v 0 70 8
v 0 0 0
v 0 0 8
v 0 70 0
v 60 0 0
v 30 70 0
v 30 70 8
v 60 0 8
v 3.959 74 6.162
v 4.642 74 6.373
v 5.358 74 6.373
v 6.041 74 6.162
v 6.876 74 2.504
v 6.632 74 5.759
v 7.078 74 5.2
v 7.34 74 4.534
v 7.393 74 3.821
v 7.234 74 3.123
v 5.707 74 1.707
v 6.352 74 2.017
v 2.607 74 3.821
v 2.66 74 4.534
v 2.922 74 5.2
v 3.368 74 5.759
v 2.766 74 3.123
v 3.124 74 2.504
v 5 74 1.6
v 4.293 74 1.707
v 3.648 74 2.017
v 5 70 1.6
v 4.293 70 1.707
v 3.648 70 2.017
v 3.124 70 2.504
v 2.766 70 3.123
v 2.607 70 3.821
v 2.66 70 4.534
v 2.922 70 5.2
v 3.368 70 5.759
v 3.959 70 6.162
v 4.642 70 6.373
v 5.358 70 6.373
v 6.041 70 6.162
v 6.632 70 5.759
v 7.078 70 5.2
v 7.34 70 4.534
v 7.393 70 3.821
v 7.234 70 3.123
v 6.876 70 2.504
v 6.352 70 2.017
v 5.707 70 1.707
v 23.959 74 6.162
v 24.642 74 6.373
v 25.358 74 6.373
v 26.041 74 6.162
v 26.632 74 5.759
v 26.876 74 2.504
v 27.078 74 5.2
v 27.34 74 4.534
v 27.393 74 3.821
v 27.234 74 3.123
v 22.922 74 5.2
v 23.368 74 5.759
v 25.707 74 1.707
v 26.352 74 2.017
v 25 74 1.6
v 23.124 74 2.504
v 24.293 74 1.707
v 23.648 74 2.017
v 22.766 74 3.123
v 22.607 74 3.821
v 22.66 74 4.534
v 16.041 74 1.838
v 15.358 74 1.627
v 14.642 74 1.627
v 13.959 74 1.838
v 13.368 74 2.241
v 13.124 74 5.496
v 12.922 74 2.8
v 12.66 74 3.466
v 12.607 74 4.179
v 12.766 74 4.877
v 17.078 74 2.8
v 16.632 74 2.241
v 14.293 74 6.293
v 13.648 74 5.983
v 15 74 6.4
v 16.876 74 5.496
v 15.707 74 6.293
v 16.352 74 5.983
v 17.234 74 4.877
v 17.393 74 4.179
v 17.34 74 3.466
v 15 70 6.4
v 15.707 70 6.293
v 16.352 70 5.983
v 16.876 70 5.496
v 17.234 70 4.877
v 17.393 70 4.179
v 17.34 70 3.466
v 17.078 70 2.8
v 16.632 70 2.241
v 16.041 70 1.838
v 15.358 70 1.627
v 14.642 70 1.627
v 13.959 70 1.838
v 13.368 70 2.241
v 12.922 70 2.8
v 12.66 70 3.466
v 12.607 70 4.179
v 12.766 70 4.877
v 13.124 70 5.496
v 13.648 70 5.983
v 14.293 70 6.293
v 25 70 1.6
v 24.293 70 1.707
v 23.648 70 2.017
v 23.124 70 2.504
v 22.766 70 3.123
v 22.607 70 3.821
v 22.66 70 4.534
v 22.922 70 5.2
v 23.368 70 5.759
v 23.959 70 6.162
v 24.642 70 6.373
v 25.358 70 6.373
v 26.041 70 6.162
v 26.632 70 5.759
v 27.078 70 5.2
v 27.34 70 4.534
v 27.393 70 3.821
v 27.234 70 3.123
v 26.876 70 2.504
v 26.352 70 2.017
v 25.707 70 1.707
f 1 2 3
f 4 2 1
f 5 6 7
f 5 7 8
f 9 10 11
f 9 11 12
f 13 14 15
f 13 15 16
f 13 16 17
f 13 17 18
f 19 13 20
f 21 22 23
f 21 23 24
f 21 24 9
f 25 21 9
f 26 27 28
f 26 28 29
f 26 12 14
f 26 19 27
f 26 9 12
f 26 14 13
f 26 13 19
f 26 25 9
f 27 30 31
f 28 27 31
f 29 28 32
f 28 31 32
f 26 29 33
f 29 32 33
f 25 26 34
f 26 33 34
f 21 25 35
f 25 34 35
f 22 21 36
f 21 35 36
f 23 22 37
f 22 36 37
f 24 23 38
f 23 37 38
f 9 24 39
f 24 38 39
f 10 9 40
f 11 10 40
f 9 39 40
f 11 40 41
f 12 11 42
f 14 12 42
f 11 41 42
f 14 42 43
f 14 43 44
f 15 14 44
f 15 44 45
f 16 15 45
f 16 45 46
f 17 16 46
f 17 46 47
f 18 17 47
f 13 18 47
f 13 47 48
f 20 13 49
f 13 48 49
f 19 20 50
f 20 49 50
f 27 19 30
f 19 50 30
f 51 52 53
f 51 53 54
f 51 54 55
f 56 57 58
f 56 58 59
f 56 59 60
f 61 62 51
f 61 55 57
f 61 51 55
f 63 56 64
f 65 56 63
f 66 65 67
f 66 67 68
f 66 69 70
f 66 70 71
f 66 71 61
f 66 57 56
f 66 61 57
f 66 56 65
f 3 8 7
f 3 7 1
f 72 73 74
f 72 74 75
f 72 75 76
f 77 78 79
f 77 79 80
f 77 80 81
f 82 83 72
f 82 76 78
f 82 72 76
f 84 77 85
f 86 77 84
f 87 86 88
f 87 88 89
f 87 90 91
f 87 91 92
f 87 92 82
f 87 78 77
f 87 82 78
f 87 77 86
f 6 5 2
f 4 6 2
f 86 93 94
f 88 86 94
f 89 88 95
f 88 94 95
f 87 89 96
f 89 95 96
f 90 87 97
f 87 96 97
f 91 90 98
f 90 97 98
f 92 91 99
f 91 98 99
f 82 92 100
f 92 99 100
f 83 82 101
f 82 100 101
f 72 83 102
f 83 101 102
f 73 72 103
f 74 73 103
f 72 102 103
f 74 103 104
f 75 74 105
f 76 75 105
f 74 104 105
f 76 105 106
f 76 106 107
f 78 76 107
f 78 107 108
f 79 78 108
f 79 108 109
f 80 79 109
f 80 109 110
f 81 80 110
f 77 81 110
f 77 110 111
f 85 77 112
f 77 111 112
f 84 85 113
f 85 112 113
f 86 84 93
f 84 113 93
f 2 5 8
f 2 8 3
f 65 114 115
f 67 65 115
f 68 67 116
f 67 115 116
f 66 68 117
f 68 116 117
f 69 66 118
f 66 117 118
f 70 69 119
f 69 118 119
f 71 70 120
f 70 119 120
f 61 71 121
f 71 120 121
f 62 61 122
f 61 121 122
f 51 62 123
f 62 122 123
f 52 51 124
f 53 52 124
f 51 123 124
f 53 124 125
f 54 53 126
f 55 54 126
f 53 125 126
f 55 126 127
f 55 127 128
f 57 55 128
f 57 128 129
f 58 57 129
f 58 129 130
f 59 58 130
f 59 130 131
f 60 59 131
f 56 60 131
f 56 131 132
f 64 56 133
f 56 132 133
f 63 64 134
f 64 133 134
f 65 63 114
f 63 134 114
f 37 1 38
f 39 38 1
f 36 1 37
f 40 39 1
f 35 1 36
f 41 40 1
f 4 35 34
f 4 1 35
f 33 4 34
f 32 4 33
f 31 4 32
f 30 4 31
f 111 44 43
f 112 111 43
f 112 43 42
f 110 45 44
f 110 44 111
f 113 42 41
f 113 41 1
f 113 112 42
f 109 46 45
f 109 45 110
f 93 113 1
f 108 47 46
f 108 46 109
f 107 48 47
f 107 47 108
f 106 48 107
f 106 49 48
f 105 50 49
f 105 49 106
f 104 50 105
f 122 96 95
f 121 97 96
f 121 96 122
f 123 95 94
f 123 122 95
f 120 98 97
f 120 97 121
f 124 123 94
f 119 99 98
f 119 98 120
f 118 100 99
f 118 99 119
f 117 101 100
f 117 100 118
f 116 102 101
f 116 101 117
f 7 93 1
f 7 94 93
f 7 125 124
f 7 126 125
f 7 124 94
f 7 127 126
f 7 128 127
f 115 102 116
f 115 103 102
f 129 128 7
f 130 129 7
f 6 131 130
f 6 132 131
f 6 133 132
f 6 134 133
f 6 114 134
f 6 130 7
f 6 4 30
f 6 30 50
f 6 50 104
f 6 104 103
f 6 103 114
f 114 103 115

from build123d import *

# Parameters (mm, degrees)
RESSALTO_EXTRUS_O1_DEPTH = 8
ESBO_O2_R                = 2.4
RESSALTO_EXTRUS_O2_DEPTH = 4


with BuildPart() as part:
    # Esboço1 → Ressalto-extrusão1 (new body)
    with BuildSketch(Plane.XY):
        Polygon((0, 0), (0, 70), (30, 70), (60, 0), align=None)
    extrude(amount=RESSALTO_EXTRUS_O1_DEPTH)

    # Esboço2 → Ressalto-extrusão2 (add)
    with BuildSketch(Plane(origin=(0, 70, 0), x_dir=(1, 0, 0), z_dir=(0, 1, 0))):
        with Locations(Location((25, -4, 0), (0, 0, 90))):
            Circle(ESBO_O2_R)
        with Locations(Location((15, -4, 0), (0, 0, 270))):
            Circle(ESBO_O2_R)
        with Locations(Location((5, -4, 0), (0, 0, 90))):
            Circle(ESBO_O2_R)
    extrude(amount=RESSALTO_EXTRUS_O2_DEPTH)


solid = part.part
